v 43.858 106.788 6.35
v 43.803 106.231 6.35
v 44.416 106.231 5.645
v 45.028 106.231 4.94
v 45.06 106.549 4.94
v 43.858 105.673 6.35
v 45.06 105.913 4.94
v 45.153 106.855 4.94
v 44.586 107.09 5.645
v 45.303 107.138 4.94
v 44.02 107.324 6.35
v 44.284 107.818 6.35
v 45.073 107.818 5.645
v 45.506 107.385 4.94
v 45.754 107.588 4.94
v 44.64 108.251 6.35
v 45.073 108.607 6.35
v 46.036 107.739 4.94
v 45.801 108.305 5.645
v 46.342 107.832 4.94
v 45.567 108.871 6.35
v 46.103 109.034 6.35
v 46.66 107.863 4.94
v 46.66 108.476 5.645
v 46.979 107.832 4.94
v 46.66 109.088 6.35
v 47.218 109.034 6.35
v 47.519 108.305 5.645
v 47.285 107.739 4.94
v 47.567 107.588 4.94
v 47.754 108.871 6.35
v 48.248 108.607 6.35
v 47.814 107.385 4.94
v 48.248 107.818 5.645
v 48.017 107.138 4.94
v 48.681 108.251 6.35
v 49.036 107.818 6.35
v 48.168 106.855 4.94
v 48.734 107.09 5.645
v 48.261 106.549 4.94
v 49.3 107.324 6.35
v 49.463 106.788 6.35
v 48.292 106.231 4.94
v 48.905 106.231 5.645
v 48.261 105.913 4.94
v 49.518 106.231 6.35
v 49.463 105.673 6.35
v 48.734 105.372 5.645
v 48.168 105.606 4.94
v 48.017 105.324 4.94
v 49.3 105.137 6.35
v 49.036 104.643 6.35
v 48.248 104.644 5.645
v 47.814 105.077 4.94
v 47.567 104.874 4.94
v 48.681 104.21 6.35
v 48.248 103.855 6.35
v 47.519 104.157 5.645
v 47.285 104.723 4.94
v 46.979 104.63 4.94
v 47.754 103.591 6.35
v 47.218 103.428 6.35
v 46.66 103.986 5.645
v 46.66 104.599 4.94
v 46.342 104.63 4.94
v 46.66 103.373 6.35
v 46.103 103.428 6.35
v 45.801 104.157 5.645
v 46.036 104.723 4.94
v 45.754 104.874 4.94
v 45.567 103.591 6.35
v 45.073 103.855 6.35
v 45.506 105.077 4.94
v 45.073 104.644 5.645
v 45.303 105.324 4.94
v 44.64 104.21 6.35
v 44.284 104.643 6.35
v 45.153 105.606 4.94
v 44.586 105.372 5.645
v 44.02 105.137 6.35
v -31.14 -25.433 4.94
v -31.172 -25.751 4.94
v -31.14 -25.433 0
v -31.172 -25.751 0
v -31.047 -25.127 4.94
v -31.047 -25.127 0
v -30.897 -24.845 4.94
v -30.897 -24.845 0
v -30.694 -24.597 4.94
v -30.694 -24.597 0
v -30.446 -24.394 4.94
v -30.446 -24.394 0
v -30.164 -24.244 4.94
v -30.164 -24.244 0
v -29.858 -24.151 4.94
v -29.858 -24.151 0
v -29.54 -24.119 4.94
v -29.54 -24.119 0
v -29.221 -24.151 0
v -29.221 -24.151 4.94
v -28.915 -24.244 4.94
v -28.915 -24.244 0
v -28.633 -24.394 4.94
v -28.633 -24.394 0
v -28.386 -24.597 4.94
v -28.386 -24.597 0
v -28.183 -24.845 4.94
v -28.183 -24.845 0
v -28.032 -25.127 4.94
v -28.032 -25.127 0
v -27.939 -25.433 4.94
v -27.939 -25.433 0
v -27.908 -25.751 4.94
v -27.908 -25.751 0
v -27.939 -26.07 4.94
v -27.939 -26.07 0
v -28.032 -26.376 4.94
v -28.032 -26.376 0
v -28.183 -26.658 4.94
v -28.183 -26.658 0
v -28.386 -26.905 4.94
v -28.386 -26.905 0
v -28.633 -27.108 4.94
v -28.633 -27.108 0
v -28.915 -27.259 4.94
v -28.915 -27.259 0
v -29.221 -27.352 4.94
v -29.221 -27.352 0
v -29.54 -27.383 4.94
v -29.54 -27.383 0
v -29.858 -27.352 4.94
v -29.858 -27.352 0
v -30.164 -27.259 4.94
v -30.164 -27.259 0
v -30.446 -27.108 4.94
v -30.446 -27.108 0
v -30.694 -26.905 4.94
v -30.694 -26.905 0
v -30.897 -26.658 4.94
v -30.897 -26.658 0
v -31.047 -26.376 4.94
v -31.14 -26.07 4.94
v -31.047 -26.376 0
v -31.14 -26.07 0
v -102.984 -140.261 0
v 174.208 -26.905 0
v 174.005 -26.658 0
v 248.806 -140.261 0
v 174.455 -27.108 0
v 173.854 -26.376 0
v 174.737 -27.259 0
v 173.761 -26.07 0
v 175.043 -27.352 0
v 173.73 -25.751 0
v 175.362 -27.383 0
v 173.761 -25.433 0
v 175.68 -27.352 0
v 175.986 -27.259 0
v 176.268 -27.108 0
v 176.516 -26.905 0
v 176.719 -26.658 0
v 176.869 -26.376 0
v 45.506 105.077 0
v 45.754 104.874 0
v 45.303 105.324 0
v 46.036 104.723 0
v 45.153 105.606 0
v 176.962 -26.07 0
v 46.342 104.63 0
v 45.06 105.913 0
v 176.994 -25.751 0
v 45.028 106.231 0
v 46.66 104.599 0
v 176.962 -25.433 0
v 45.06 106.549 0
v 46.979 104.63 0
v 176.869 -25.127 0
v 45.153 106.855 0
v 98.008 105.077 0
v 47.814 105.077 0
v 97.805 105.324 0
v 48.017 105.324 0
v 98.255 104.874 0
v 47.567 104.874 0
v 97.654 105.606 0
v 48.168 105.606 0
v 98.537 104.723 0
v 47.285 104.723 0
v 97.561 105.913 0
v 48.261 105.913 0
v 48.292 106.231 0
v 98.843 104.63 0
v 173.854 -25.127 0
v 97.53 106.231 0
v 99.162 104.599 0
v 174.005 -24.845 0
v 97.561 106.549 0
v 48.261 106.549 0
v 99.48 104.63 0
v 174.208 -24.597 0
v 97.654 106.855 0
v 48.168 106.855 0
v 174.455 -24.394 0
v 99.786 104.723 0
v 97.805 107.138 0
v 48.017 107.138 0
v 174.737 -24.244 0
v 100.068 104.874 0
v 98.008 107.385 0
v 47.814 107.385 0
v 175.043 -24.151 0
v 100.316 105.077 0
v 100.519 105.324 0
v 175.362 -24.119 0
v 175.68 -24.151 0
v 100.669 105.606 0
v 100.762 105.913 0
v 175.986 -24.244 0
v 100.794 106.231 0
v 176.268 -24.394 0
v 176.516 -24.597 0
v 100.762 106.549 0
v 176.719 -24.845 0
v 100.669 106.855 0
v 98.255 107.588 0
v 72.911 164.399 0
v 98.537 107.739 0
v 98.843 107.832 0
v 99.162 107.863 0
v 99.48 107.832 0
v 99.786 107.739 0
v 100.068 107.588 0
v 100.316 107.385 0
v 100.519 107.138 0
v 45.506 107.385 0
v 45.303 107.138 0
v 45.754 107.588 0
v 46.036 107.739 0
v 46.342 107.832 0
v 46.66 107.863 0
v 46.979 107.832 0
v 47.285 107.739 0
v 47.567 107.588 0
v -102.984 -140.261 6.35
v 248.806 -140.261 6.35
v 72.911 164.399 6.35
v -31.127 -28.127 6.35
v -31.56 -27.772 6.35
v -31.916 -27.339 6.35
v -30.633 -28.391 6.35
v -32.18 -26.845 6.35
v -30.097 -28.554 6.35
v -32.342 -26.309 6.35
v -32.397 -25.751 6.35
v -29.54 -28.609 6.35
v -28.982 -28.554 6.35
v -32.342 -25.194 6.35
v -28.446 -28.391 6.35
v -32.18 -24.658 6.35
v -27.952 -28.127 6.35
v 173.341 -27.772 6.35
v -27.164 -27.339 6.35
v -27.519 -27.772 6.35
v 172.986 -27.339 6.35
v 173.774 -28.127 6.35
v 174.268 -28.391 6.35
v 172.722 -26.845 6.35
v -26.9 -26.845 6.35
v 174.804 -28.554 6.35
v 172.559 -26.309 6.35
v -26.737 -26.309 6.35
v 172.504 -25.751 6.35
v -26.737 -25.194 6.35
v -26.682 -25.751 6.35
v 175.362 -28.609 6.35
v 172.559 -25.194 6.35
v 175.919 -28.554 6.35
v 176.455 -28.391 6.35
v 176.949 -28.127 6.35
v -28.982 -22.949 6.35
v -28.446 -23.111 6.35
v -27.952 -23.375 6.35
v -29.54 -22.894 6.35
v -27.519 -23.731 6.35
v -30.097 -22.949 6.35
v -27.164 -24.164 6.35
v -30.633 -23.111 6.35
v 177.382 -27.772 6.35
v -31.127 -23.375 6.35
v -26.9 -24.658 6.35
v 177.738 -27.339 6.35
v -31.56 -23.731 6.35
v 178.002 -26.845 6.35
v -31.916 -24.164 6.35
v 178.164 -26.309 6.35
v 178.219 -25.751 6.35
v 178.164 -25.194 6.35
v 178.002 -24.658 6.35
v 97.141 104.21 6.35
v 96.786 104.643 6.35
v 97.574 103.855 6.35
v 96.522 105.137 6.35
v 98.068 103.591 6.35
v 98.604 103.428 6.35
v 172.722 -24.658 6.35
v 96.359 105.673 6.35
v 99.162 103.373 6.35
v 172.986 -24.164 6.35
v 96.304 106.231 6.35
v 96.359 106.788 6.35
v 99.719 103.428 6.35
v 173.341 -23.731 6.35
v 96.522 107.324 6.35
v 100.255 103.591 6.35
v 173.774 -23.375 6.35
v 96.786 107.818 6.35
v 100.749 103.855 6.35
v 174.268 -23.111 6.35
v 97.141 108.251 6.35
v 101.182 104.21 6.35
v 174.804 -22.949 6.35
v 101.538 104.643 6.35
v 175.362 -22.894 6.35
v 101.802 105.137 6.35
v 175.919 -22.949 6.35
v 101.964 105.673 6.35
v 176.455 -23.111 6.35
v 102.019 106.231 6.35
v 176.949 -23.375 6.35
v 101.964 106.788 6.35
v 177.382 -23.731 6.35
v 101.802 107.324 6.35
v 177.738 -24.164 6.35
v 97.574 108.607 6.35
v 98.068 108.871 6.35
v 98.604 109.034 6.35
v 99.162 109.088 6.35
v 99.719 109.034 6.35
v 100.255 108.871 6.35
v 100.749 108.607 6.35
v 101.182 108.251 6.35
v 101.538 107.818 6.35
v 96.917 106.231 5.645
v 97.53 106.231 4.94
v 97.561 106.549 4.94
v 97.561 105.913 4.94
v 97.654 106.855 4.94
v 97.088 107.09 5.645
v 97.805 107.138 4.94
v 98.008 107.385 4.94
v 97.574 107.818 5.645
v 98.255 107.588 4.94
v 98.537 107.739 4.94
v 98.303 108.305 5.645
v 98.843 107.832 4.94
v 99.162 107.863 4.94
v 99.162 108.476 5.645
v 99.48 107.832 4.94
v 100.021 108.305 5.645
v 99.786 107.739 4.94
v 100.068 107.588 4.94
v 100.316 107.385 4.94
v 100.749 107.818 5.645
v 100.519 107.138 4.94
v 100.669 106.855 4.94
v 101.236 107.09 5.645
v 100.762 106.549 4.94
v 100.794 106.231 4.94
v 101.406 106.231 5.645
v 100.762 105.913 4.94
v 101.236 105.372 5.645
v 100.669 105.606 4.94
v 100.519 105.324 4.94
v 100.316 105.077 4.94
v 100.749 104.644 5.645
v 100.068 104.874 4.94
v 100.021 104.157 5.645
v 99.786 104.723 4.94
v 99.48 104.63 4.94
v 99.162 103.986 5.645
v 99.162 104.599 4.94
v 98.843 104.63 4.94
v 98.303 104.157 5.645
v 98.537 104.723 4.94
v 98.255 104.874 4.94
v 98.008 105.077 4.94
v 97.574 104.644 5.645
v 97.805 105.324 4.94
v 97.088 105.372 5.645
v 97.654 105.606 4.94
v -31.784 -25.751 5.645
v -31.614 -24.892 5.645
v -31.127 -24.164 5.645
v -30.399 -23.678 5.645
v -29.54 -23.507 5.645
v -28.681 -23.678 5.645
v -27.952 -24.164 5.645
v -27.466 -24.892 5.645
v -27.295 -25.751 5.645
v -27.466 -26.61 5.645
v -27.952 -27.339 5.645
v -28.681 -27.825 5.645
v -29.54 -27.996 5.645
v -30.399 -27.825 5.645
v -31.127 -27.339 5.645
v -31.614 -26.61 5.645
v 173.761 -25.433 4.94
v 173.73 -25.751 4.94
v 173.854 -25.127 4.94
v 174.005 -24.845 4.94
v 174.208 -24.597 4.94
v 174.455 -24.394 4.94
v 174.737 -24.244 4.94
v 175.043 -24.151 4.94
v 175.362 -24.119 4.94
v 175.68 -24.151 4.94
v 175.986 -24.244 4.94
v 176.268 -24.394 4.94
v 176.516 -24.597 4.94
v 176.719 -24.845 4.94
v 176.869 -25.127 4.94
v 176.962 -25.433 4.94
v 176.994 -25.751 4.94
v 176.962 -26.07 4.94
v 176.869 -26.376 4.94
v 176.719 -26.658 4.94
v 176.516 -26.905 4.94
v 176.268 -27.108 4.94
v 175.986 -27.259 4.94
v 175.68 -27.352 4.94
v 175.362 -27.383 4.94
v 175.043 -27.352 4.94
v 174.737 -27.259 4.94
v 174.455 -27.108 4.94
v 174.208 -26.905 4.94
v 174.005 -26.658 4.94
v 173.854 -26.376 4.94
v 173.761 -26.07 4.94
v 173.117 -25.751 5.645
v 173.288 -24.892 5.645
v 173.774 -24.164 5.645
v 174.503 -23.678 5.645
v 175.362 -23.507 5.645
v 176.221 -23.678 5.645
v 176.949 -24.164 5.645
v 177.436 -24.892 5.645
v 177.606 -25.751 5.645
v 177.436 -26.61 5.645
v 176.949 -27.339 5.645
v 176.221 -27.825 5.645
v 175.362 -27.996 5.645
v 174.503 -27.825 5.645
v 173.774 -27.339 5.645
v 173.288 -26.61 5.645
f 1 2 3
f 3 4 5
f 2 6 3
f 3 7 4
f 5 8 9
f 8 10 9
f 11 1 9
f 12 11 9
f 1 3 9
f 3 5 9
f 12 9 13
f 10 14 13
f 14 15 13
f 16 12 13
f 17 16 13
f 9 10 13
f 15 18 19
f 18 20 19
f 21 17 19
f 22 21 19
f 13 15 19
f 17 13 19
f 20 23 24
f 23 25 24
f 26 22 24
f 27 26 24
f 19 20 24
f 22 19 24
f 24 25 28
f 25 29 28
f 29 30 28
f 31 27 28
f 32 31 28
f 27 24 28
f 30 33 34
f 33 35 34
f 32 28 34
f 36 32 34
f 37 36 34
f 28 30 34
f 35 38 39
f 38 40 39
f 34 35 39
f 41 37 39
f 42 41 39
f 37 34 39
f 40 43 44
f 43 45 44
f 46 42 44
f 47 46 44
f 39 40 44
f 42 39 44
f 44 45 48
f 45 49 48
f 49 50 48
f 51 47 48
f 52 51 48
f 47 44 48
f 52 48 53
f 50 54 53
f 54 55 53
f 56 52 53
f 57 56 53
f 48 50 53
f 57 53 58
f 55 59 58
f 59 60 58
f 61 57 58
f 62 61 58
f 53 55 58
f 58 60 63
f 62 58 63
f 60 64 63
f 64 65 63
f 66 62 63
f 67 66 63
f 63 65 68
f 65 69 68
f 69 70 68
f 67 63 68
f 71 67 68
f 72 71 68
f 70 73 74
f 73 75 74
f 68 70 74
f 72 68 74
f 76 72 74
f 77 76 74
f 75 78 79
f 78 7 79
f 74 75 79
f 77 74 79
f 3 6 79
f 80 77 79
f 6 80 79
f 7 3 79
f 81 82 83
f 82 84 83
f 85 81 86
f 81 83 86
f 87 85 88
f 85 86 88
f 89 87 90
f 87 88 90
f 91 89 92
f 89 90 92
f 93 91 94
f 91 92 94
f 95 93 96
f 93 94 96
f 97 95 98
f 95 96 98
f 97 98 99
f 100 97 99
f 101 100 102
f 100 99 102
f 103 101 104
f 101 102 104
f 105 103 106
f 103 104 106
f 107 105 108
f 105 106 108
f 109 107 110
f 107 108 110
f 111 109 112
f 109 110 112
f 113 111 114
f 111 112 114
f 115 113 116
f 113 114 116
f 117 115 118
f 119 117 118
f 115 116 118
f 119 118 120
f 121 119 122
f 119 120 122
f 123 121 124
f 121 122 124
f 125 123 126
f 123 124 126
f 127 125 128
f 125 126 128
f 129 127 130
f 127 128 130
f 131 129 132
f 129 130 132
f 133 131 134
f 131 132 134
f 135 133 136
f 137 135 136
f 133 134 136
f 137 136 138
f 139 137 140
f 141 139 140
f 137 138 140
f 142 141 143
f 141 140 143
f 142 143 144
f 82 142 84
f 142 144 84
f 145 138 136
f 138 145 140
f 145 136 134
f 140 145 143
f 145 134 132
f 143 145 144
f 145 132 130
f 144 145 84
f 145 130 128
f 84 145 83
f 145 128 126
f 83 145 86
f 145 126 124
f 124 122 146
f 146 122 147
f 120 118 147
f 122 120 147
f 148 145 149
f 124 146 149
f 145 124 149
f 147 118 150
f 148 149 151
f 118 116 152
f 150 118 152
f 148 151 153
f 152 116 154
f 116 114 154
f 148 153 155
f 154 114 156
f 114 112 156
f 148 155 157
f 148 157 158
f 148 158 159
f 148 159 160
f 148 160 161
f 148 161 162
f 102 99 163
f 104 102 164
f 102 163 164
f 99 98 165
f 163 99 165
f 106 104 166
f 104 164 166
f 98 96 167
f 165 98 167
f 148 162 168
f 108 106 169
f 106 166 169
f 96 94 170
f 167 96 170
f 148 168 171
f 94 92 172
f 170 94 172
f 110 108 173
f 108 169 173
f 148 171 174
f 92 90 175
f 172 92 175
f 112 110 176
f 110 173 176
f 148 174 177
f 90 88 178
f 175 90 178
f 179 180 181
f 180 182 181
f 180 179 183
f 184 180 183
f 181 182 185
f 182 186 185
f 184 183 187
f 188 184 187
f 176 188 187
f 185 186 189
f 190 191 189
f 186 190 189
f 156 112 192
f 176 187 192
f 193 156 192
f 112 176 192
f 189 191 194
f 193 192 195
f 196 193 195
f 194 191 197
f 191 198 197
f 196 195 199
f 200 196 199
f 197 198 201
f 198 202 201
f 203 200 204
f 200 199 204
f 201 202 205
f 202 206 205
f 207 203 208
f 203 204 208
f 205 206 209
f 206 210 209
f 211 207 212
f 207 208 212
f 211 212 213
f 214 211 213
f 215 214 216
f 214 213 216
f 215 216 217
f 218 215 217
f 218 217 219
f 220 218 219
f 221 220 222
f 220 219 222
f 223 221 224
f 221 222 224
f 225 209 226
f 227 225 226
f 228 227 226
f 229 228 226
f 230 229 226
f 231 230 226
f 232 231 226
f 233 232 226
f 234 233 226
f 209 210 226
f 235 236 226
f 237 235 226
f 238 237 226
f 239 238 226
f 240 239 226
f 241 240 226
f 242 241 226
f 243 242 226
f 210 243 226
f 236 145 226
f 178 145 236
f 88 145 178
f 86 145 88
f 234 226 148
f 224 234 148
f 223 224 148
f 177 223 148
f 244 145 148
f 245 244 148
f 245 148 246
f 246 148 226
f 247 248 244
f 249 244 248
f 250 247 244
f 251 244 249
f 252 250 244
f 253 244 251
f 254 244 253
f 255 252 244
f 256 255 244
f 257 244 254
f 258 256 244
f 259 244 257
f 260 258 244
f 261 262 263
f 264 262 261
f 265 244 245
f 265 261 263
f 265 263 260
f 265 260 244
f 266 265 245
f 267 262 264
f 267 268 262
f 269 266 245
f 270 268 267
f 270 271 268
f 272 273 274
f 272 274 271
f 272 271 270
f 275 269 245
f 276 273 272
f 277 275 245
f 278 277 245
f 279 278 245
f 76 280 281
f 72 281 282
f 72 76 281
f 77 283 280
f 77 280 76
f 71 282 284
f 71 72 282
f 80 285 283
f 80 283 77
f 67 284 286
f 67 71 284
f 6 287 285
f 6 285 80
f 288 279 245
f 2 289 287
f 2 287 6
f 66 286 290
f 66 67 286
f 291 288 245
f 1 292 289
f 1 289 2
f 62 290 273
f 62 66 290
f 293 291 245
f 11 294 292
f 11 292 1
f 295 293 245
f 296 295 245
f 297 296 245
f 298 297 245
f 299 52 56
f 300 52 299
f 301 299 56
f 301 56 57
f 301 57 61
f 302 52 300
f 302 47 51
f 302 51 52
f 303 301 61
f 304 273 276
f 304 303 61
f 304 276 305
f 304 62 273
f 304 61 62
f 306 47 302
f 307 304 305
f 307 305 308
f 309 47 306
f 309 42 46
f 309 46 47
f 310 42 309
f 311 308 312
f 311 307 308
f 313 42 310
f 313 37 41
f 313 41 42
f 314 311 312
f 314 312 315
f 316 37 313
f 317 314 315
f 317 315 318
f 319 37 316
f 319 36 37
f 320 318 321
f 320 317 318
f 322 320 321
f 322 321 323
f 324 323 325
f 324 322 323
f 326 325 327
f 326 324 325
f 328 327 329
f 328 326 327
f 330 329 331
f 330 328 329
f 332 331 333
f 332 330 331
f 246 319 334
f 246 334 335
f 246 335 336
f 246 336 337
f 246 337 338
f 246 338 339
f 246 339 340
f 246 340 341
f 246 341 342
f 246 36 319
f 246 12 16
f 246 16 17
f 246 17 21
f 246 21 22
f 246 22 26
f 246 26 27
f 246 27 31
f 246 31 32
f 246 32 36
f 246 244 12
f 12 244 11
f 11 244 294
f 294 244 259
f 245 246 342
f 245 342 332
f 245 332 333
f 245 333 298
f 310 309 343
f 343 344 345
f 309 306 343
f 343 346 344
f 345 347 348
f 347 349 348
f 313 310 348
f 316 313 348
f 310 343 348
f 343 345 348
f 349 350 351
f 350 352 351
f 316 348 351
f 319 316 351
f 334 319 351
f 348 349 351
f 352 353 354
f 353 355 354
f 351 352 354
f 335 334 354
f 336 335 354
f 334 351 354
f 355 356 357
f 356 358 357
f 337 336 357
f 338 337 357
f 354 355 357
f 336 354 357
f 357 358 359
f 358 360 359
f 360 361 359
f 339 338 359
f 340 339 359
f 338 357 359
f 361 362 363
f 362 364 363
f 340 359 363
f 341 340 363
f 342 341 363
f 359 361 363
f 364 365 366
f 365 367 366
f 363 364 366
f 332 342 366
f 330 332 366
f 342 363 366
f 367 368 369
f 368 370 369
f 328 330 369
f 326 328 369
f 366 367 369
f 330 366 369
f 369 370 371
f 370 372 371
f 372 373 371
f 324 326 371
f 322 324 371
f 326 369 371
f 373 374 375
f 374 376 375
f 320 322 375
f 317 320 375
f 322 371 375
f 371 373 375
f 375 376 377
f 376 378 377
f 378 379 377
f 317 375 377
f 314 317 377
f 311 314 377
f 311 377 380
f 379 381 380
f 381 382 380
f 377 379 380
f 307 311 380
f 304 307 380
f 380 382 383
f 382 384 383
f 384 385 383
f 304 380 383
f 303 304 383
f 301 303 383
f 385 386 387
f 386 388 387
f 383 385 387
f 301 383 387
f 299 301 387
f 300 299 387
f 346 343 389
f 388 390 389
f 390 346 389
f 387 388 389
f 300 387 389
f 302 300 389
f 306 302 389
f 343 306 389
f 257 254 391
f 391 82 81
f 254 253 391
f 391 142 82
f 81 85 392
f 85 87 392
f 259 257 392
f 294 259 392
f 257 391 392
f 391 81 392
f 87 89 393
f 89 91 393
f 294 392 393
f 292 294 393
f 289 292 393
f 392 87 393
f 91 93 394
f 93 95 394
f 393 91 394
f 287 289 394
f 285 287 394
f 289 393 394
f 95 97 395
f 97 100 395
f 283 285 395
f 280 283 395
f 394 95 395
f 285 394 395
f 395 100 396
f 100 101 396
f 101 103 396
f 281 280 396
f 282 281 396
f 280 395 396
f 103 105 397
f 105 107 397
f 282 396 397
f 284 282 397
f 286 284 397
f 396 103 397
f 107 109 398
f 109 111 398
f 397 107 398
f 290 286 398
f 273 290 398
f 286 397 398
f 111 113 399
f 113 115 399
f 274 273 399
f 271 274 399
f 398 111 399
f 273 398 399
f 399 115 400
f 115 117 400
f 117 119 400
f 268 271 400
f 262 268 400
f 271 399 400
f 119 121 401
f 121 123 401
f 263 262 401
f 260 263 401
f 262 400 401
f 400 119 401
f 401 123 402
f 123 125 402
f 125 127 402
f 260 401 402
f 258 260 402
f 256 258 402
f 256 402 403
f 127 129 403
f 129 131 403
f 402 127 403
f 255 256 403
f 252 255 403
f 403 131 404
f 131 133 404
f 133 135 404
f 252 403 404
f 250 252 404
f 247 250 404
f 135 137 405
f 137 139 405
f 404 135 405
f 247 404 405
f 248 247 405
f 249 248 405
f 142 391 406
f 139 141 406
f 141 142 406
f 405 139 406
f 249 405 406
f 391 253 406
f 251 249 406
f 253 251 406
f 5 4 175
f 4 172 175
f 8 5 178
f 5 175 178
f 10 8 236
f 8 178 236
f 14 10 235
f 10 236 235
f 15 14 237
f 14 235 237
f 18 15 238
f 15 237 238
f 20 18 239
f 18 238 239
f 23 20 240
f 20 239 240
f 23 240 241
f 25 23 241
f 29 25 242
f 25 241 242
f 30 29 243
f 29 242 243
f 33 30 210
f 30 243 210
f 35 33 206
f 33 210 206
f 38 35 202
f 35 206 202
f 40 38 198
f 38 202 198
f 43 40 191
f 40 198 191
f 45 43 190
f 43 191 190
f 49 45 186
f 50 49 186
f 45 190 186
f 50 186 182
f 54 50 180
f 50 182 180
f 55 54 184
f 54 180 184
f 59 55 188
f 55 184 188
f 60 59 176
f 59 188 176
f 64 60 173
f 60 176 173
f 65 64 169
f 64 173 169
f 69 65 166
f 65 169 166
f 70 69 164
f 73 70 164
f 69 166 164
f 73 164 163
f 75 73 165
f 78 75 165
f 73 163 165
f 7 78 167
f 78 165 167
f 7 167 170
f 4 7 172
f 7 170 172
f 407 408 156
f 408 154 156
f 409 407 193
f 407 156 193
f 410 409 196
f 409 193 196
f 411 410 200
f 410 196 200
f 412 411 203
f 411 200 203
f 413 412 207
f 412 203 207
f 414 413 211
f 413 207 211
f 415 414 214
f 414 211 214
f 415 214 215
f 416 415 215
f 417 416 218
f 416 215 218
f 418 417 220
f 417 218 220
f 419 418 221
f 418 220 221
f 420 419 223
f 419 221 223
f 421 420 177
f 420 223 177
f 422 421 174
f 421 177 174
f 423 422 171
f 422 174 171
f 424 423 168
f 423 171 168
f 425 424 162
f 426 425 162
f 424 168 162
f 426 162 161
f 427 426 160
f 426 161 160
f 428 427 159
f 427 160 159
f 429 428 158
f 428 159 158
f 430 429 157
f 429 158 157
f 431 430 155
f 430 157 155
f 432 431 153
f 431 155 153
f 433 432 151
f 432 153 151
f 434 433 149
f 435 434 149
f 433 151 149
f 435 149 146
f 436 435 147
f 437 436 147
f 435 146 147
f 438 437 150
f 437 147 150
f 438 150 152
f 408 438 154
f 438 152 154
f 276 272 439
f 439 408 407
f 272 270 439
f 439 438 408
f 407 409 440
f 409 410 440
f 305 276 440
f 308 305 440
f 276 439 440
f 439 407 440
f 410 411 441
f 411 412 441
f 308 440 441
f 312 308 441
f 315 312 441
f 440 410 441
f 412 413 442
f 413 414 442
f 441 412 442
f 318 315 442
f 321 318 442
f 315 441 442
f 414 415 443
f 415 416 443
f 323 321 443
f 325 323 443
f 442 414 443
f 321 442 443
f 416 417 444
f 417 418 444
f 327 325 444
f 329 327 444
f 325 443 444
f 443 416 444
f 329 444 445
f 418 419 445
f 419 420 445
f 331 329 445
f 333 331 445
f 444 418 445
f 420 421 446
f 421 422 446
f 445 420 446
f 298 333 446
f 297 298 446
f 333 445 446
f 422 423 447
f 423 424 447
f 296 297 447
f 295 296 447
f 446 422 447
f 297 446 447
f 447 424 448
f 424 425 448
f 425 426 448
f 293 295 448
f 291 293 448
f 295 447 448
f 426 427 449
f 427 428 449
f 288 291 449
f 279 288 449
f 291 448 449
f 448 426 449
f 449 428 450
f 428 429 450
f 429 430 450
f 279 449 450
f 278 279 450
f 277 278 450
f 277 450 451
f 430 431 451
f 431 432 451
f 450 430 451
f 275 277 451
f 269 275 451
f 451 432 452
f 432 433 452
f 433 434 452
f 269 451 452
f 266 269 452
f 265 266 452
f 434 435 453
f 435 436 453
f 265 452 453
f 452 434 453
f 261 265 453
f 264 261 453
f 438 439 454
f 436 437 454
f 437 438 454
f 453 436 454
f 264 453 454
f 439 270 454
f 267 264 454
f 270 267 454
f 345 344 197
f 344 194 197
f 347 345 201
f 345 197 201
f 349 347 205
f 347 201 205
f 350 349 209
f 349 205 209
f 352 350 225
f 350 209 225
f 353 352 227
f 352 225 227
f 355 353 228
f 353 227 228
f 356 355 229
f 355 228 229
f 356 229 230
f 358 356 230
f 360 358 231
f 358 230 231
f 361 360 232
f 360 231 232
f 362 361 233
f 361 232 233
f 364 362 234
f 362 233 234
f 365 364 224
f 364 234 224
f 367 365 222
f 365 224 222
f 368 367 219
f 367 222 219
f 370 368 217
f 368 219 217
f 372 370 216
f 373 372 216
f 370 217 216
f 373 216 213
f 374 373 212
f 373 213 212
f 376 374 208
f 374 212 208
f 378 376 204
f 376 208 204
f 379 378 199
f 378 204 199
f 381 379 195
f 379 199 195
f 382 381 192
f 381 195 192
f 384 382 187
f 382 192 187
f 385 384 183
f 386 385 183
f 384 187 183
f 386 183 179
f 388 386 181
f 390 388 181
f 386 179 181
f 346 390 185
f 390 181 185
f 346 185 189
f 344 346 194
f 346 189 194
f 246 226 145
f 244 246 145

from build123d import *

# Parameters (mm, degrees)
BOSS_EXTRUDE1_DEPTH                            = 6.35
CSK_FOR_4_FLAT_HEAD_MACHINE_SCREW1_D           = 3.2639
CSK_FOR_4_FLAT_HEAD_MACHINE_SCREW1_CSINK_D     = 5.715
CSK_FOR_4_FLAT_HEAD_MACHINE_SCREW1_CSINK_ANGLE = 82


with BuildPart() as part:
    # Sketch1 → Boss-Extrude1 (new body)
    with BuildSketch(Plane.XY):
        Polygon((72.910979943, 164.398527709), (-102.984020057, -140.260549088), (248.805979943, -140.260549088), align=None)
    extrude(amount=BOSS_EXTRUDE1_DEPTH)

    # CSK for #4 Flat Head Machine Screw1 (through all)
    with Locations(Plane(origin=(46.660241257, 106.230914569, 6.35), x_dir=(1, 0, 0), z_dir=(0, 0, 1))):
        with Locations((0, 0), (-76.2, -131.982271537), (52.501477372, 0), (128.701477372, -131.982271537)):
            CounterSinkHole(CSK_FOR_4_FLAT_HEAD_MACHINE_SCREW1_D / 2, CSK_FOR_4_FLAT_HEAD_MACHINE_SCREW1_CSINK_D / 2, counter_sink_angle=CSK_FOR_4_FLAT_HEAD_MACHINE_SCREW1_CSINK_ANGLE)


solid = part.part
